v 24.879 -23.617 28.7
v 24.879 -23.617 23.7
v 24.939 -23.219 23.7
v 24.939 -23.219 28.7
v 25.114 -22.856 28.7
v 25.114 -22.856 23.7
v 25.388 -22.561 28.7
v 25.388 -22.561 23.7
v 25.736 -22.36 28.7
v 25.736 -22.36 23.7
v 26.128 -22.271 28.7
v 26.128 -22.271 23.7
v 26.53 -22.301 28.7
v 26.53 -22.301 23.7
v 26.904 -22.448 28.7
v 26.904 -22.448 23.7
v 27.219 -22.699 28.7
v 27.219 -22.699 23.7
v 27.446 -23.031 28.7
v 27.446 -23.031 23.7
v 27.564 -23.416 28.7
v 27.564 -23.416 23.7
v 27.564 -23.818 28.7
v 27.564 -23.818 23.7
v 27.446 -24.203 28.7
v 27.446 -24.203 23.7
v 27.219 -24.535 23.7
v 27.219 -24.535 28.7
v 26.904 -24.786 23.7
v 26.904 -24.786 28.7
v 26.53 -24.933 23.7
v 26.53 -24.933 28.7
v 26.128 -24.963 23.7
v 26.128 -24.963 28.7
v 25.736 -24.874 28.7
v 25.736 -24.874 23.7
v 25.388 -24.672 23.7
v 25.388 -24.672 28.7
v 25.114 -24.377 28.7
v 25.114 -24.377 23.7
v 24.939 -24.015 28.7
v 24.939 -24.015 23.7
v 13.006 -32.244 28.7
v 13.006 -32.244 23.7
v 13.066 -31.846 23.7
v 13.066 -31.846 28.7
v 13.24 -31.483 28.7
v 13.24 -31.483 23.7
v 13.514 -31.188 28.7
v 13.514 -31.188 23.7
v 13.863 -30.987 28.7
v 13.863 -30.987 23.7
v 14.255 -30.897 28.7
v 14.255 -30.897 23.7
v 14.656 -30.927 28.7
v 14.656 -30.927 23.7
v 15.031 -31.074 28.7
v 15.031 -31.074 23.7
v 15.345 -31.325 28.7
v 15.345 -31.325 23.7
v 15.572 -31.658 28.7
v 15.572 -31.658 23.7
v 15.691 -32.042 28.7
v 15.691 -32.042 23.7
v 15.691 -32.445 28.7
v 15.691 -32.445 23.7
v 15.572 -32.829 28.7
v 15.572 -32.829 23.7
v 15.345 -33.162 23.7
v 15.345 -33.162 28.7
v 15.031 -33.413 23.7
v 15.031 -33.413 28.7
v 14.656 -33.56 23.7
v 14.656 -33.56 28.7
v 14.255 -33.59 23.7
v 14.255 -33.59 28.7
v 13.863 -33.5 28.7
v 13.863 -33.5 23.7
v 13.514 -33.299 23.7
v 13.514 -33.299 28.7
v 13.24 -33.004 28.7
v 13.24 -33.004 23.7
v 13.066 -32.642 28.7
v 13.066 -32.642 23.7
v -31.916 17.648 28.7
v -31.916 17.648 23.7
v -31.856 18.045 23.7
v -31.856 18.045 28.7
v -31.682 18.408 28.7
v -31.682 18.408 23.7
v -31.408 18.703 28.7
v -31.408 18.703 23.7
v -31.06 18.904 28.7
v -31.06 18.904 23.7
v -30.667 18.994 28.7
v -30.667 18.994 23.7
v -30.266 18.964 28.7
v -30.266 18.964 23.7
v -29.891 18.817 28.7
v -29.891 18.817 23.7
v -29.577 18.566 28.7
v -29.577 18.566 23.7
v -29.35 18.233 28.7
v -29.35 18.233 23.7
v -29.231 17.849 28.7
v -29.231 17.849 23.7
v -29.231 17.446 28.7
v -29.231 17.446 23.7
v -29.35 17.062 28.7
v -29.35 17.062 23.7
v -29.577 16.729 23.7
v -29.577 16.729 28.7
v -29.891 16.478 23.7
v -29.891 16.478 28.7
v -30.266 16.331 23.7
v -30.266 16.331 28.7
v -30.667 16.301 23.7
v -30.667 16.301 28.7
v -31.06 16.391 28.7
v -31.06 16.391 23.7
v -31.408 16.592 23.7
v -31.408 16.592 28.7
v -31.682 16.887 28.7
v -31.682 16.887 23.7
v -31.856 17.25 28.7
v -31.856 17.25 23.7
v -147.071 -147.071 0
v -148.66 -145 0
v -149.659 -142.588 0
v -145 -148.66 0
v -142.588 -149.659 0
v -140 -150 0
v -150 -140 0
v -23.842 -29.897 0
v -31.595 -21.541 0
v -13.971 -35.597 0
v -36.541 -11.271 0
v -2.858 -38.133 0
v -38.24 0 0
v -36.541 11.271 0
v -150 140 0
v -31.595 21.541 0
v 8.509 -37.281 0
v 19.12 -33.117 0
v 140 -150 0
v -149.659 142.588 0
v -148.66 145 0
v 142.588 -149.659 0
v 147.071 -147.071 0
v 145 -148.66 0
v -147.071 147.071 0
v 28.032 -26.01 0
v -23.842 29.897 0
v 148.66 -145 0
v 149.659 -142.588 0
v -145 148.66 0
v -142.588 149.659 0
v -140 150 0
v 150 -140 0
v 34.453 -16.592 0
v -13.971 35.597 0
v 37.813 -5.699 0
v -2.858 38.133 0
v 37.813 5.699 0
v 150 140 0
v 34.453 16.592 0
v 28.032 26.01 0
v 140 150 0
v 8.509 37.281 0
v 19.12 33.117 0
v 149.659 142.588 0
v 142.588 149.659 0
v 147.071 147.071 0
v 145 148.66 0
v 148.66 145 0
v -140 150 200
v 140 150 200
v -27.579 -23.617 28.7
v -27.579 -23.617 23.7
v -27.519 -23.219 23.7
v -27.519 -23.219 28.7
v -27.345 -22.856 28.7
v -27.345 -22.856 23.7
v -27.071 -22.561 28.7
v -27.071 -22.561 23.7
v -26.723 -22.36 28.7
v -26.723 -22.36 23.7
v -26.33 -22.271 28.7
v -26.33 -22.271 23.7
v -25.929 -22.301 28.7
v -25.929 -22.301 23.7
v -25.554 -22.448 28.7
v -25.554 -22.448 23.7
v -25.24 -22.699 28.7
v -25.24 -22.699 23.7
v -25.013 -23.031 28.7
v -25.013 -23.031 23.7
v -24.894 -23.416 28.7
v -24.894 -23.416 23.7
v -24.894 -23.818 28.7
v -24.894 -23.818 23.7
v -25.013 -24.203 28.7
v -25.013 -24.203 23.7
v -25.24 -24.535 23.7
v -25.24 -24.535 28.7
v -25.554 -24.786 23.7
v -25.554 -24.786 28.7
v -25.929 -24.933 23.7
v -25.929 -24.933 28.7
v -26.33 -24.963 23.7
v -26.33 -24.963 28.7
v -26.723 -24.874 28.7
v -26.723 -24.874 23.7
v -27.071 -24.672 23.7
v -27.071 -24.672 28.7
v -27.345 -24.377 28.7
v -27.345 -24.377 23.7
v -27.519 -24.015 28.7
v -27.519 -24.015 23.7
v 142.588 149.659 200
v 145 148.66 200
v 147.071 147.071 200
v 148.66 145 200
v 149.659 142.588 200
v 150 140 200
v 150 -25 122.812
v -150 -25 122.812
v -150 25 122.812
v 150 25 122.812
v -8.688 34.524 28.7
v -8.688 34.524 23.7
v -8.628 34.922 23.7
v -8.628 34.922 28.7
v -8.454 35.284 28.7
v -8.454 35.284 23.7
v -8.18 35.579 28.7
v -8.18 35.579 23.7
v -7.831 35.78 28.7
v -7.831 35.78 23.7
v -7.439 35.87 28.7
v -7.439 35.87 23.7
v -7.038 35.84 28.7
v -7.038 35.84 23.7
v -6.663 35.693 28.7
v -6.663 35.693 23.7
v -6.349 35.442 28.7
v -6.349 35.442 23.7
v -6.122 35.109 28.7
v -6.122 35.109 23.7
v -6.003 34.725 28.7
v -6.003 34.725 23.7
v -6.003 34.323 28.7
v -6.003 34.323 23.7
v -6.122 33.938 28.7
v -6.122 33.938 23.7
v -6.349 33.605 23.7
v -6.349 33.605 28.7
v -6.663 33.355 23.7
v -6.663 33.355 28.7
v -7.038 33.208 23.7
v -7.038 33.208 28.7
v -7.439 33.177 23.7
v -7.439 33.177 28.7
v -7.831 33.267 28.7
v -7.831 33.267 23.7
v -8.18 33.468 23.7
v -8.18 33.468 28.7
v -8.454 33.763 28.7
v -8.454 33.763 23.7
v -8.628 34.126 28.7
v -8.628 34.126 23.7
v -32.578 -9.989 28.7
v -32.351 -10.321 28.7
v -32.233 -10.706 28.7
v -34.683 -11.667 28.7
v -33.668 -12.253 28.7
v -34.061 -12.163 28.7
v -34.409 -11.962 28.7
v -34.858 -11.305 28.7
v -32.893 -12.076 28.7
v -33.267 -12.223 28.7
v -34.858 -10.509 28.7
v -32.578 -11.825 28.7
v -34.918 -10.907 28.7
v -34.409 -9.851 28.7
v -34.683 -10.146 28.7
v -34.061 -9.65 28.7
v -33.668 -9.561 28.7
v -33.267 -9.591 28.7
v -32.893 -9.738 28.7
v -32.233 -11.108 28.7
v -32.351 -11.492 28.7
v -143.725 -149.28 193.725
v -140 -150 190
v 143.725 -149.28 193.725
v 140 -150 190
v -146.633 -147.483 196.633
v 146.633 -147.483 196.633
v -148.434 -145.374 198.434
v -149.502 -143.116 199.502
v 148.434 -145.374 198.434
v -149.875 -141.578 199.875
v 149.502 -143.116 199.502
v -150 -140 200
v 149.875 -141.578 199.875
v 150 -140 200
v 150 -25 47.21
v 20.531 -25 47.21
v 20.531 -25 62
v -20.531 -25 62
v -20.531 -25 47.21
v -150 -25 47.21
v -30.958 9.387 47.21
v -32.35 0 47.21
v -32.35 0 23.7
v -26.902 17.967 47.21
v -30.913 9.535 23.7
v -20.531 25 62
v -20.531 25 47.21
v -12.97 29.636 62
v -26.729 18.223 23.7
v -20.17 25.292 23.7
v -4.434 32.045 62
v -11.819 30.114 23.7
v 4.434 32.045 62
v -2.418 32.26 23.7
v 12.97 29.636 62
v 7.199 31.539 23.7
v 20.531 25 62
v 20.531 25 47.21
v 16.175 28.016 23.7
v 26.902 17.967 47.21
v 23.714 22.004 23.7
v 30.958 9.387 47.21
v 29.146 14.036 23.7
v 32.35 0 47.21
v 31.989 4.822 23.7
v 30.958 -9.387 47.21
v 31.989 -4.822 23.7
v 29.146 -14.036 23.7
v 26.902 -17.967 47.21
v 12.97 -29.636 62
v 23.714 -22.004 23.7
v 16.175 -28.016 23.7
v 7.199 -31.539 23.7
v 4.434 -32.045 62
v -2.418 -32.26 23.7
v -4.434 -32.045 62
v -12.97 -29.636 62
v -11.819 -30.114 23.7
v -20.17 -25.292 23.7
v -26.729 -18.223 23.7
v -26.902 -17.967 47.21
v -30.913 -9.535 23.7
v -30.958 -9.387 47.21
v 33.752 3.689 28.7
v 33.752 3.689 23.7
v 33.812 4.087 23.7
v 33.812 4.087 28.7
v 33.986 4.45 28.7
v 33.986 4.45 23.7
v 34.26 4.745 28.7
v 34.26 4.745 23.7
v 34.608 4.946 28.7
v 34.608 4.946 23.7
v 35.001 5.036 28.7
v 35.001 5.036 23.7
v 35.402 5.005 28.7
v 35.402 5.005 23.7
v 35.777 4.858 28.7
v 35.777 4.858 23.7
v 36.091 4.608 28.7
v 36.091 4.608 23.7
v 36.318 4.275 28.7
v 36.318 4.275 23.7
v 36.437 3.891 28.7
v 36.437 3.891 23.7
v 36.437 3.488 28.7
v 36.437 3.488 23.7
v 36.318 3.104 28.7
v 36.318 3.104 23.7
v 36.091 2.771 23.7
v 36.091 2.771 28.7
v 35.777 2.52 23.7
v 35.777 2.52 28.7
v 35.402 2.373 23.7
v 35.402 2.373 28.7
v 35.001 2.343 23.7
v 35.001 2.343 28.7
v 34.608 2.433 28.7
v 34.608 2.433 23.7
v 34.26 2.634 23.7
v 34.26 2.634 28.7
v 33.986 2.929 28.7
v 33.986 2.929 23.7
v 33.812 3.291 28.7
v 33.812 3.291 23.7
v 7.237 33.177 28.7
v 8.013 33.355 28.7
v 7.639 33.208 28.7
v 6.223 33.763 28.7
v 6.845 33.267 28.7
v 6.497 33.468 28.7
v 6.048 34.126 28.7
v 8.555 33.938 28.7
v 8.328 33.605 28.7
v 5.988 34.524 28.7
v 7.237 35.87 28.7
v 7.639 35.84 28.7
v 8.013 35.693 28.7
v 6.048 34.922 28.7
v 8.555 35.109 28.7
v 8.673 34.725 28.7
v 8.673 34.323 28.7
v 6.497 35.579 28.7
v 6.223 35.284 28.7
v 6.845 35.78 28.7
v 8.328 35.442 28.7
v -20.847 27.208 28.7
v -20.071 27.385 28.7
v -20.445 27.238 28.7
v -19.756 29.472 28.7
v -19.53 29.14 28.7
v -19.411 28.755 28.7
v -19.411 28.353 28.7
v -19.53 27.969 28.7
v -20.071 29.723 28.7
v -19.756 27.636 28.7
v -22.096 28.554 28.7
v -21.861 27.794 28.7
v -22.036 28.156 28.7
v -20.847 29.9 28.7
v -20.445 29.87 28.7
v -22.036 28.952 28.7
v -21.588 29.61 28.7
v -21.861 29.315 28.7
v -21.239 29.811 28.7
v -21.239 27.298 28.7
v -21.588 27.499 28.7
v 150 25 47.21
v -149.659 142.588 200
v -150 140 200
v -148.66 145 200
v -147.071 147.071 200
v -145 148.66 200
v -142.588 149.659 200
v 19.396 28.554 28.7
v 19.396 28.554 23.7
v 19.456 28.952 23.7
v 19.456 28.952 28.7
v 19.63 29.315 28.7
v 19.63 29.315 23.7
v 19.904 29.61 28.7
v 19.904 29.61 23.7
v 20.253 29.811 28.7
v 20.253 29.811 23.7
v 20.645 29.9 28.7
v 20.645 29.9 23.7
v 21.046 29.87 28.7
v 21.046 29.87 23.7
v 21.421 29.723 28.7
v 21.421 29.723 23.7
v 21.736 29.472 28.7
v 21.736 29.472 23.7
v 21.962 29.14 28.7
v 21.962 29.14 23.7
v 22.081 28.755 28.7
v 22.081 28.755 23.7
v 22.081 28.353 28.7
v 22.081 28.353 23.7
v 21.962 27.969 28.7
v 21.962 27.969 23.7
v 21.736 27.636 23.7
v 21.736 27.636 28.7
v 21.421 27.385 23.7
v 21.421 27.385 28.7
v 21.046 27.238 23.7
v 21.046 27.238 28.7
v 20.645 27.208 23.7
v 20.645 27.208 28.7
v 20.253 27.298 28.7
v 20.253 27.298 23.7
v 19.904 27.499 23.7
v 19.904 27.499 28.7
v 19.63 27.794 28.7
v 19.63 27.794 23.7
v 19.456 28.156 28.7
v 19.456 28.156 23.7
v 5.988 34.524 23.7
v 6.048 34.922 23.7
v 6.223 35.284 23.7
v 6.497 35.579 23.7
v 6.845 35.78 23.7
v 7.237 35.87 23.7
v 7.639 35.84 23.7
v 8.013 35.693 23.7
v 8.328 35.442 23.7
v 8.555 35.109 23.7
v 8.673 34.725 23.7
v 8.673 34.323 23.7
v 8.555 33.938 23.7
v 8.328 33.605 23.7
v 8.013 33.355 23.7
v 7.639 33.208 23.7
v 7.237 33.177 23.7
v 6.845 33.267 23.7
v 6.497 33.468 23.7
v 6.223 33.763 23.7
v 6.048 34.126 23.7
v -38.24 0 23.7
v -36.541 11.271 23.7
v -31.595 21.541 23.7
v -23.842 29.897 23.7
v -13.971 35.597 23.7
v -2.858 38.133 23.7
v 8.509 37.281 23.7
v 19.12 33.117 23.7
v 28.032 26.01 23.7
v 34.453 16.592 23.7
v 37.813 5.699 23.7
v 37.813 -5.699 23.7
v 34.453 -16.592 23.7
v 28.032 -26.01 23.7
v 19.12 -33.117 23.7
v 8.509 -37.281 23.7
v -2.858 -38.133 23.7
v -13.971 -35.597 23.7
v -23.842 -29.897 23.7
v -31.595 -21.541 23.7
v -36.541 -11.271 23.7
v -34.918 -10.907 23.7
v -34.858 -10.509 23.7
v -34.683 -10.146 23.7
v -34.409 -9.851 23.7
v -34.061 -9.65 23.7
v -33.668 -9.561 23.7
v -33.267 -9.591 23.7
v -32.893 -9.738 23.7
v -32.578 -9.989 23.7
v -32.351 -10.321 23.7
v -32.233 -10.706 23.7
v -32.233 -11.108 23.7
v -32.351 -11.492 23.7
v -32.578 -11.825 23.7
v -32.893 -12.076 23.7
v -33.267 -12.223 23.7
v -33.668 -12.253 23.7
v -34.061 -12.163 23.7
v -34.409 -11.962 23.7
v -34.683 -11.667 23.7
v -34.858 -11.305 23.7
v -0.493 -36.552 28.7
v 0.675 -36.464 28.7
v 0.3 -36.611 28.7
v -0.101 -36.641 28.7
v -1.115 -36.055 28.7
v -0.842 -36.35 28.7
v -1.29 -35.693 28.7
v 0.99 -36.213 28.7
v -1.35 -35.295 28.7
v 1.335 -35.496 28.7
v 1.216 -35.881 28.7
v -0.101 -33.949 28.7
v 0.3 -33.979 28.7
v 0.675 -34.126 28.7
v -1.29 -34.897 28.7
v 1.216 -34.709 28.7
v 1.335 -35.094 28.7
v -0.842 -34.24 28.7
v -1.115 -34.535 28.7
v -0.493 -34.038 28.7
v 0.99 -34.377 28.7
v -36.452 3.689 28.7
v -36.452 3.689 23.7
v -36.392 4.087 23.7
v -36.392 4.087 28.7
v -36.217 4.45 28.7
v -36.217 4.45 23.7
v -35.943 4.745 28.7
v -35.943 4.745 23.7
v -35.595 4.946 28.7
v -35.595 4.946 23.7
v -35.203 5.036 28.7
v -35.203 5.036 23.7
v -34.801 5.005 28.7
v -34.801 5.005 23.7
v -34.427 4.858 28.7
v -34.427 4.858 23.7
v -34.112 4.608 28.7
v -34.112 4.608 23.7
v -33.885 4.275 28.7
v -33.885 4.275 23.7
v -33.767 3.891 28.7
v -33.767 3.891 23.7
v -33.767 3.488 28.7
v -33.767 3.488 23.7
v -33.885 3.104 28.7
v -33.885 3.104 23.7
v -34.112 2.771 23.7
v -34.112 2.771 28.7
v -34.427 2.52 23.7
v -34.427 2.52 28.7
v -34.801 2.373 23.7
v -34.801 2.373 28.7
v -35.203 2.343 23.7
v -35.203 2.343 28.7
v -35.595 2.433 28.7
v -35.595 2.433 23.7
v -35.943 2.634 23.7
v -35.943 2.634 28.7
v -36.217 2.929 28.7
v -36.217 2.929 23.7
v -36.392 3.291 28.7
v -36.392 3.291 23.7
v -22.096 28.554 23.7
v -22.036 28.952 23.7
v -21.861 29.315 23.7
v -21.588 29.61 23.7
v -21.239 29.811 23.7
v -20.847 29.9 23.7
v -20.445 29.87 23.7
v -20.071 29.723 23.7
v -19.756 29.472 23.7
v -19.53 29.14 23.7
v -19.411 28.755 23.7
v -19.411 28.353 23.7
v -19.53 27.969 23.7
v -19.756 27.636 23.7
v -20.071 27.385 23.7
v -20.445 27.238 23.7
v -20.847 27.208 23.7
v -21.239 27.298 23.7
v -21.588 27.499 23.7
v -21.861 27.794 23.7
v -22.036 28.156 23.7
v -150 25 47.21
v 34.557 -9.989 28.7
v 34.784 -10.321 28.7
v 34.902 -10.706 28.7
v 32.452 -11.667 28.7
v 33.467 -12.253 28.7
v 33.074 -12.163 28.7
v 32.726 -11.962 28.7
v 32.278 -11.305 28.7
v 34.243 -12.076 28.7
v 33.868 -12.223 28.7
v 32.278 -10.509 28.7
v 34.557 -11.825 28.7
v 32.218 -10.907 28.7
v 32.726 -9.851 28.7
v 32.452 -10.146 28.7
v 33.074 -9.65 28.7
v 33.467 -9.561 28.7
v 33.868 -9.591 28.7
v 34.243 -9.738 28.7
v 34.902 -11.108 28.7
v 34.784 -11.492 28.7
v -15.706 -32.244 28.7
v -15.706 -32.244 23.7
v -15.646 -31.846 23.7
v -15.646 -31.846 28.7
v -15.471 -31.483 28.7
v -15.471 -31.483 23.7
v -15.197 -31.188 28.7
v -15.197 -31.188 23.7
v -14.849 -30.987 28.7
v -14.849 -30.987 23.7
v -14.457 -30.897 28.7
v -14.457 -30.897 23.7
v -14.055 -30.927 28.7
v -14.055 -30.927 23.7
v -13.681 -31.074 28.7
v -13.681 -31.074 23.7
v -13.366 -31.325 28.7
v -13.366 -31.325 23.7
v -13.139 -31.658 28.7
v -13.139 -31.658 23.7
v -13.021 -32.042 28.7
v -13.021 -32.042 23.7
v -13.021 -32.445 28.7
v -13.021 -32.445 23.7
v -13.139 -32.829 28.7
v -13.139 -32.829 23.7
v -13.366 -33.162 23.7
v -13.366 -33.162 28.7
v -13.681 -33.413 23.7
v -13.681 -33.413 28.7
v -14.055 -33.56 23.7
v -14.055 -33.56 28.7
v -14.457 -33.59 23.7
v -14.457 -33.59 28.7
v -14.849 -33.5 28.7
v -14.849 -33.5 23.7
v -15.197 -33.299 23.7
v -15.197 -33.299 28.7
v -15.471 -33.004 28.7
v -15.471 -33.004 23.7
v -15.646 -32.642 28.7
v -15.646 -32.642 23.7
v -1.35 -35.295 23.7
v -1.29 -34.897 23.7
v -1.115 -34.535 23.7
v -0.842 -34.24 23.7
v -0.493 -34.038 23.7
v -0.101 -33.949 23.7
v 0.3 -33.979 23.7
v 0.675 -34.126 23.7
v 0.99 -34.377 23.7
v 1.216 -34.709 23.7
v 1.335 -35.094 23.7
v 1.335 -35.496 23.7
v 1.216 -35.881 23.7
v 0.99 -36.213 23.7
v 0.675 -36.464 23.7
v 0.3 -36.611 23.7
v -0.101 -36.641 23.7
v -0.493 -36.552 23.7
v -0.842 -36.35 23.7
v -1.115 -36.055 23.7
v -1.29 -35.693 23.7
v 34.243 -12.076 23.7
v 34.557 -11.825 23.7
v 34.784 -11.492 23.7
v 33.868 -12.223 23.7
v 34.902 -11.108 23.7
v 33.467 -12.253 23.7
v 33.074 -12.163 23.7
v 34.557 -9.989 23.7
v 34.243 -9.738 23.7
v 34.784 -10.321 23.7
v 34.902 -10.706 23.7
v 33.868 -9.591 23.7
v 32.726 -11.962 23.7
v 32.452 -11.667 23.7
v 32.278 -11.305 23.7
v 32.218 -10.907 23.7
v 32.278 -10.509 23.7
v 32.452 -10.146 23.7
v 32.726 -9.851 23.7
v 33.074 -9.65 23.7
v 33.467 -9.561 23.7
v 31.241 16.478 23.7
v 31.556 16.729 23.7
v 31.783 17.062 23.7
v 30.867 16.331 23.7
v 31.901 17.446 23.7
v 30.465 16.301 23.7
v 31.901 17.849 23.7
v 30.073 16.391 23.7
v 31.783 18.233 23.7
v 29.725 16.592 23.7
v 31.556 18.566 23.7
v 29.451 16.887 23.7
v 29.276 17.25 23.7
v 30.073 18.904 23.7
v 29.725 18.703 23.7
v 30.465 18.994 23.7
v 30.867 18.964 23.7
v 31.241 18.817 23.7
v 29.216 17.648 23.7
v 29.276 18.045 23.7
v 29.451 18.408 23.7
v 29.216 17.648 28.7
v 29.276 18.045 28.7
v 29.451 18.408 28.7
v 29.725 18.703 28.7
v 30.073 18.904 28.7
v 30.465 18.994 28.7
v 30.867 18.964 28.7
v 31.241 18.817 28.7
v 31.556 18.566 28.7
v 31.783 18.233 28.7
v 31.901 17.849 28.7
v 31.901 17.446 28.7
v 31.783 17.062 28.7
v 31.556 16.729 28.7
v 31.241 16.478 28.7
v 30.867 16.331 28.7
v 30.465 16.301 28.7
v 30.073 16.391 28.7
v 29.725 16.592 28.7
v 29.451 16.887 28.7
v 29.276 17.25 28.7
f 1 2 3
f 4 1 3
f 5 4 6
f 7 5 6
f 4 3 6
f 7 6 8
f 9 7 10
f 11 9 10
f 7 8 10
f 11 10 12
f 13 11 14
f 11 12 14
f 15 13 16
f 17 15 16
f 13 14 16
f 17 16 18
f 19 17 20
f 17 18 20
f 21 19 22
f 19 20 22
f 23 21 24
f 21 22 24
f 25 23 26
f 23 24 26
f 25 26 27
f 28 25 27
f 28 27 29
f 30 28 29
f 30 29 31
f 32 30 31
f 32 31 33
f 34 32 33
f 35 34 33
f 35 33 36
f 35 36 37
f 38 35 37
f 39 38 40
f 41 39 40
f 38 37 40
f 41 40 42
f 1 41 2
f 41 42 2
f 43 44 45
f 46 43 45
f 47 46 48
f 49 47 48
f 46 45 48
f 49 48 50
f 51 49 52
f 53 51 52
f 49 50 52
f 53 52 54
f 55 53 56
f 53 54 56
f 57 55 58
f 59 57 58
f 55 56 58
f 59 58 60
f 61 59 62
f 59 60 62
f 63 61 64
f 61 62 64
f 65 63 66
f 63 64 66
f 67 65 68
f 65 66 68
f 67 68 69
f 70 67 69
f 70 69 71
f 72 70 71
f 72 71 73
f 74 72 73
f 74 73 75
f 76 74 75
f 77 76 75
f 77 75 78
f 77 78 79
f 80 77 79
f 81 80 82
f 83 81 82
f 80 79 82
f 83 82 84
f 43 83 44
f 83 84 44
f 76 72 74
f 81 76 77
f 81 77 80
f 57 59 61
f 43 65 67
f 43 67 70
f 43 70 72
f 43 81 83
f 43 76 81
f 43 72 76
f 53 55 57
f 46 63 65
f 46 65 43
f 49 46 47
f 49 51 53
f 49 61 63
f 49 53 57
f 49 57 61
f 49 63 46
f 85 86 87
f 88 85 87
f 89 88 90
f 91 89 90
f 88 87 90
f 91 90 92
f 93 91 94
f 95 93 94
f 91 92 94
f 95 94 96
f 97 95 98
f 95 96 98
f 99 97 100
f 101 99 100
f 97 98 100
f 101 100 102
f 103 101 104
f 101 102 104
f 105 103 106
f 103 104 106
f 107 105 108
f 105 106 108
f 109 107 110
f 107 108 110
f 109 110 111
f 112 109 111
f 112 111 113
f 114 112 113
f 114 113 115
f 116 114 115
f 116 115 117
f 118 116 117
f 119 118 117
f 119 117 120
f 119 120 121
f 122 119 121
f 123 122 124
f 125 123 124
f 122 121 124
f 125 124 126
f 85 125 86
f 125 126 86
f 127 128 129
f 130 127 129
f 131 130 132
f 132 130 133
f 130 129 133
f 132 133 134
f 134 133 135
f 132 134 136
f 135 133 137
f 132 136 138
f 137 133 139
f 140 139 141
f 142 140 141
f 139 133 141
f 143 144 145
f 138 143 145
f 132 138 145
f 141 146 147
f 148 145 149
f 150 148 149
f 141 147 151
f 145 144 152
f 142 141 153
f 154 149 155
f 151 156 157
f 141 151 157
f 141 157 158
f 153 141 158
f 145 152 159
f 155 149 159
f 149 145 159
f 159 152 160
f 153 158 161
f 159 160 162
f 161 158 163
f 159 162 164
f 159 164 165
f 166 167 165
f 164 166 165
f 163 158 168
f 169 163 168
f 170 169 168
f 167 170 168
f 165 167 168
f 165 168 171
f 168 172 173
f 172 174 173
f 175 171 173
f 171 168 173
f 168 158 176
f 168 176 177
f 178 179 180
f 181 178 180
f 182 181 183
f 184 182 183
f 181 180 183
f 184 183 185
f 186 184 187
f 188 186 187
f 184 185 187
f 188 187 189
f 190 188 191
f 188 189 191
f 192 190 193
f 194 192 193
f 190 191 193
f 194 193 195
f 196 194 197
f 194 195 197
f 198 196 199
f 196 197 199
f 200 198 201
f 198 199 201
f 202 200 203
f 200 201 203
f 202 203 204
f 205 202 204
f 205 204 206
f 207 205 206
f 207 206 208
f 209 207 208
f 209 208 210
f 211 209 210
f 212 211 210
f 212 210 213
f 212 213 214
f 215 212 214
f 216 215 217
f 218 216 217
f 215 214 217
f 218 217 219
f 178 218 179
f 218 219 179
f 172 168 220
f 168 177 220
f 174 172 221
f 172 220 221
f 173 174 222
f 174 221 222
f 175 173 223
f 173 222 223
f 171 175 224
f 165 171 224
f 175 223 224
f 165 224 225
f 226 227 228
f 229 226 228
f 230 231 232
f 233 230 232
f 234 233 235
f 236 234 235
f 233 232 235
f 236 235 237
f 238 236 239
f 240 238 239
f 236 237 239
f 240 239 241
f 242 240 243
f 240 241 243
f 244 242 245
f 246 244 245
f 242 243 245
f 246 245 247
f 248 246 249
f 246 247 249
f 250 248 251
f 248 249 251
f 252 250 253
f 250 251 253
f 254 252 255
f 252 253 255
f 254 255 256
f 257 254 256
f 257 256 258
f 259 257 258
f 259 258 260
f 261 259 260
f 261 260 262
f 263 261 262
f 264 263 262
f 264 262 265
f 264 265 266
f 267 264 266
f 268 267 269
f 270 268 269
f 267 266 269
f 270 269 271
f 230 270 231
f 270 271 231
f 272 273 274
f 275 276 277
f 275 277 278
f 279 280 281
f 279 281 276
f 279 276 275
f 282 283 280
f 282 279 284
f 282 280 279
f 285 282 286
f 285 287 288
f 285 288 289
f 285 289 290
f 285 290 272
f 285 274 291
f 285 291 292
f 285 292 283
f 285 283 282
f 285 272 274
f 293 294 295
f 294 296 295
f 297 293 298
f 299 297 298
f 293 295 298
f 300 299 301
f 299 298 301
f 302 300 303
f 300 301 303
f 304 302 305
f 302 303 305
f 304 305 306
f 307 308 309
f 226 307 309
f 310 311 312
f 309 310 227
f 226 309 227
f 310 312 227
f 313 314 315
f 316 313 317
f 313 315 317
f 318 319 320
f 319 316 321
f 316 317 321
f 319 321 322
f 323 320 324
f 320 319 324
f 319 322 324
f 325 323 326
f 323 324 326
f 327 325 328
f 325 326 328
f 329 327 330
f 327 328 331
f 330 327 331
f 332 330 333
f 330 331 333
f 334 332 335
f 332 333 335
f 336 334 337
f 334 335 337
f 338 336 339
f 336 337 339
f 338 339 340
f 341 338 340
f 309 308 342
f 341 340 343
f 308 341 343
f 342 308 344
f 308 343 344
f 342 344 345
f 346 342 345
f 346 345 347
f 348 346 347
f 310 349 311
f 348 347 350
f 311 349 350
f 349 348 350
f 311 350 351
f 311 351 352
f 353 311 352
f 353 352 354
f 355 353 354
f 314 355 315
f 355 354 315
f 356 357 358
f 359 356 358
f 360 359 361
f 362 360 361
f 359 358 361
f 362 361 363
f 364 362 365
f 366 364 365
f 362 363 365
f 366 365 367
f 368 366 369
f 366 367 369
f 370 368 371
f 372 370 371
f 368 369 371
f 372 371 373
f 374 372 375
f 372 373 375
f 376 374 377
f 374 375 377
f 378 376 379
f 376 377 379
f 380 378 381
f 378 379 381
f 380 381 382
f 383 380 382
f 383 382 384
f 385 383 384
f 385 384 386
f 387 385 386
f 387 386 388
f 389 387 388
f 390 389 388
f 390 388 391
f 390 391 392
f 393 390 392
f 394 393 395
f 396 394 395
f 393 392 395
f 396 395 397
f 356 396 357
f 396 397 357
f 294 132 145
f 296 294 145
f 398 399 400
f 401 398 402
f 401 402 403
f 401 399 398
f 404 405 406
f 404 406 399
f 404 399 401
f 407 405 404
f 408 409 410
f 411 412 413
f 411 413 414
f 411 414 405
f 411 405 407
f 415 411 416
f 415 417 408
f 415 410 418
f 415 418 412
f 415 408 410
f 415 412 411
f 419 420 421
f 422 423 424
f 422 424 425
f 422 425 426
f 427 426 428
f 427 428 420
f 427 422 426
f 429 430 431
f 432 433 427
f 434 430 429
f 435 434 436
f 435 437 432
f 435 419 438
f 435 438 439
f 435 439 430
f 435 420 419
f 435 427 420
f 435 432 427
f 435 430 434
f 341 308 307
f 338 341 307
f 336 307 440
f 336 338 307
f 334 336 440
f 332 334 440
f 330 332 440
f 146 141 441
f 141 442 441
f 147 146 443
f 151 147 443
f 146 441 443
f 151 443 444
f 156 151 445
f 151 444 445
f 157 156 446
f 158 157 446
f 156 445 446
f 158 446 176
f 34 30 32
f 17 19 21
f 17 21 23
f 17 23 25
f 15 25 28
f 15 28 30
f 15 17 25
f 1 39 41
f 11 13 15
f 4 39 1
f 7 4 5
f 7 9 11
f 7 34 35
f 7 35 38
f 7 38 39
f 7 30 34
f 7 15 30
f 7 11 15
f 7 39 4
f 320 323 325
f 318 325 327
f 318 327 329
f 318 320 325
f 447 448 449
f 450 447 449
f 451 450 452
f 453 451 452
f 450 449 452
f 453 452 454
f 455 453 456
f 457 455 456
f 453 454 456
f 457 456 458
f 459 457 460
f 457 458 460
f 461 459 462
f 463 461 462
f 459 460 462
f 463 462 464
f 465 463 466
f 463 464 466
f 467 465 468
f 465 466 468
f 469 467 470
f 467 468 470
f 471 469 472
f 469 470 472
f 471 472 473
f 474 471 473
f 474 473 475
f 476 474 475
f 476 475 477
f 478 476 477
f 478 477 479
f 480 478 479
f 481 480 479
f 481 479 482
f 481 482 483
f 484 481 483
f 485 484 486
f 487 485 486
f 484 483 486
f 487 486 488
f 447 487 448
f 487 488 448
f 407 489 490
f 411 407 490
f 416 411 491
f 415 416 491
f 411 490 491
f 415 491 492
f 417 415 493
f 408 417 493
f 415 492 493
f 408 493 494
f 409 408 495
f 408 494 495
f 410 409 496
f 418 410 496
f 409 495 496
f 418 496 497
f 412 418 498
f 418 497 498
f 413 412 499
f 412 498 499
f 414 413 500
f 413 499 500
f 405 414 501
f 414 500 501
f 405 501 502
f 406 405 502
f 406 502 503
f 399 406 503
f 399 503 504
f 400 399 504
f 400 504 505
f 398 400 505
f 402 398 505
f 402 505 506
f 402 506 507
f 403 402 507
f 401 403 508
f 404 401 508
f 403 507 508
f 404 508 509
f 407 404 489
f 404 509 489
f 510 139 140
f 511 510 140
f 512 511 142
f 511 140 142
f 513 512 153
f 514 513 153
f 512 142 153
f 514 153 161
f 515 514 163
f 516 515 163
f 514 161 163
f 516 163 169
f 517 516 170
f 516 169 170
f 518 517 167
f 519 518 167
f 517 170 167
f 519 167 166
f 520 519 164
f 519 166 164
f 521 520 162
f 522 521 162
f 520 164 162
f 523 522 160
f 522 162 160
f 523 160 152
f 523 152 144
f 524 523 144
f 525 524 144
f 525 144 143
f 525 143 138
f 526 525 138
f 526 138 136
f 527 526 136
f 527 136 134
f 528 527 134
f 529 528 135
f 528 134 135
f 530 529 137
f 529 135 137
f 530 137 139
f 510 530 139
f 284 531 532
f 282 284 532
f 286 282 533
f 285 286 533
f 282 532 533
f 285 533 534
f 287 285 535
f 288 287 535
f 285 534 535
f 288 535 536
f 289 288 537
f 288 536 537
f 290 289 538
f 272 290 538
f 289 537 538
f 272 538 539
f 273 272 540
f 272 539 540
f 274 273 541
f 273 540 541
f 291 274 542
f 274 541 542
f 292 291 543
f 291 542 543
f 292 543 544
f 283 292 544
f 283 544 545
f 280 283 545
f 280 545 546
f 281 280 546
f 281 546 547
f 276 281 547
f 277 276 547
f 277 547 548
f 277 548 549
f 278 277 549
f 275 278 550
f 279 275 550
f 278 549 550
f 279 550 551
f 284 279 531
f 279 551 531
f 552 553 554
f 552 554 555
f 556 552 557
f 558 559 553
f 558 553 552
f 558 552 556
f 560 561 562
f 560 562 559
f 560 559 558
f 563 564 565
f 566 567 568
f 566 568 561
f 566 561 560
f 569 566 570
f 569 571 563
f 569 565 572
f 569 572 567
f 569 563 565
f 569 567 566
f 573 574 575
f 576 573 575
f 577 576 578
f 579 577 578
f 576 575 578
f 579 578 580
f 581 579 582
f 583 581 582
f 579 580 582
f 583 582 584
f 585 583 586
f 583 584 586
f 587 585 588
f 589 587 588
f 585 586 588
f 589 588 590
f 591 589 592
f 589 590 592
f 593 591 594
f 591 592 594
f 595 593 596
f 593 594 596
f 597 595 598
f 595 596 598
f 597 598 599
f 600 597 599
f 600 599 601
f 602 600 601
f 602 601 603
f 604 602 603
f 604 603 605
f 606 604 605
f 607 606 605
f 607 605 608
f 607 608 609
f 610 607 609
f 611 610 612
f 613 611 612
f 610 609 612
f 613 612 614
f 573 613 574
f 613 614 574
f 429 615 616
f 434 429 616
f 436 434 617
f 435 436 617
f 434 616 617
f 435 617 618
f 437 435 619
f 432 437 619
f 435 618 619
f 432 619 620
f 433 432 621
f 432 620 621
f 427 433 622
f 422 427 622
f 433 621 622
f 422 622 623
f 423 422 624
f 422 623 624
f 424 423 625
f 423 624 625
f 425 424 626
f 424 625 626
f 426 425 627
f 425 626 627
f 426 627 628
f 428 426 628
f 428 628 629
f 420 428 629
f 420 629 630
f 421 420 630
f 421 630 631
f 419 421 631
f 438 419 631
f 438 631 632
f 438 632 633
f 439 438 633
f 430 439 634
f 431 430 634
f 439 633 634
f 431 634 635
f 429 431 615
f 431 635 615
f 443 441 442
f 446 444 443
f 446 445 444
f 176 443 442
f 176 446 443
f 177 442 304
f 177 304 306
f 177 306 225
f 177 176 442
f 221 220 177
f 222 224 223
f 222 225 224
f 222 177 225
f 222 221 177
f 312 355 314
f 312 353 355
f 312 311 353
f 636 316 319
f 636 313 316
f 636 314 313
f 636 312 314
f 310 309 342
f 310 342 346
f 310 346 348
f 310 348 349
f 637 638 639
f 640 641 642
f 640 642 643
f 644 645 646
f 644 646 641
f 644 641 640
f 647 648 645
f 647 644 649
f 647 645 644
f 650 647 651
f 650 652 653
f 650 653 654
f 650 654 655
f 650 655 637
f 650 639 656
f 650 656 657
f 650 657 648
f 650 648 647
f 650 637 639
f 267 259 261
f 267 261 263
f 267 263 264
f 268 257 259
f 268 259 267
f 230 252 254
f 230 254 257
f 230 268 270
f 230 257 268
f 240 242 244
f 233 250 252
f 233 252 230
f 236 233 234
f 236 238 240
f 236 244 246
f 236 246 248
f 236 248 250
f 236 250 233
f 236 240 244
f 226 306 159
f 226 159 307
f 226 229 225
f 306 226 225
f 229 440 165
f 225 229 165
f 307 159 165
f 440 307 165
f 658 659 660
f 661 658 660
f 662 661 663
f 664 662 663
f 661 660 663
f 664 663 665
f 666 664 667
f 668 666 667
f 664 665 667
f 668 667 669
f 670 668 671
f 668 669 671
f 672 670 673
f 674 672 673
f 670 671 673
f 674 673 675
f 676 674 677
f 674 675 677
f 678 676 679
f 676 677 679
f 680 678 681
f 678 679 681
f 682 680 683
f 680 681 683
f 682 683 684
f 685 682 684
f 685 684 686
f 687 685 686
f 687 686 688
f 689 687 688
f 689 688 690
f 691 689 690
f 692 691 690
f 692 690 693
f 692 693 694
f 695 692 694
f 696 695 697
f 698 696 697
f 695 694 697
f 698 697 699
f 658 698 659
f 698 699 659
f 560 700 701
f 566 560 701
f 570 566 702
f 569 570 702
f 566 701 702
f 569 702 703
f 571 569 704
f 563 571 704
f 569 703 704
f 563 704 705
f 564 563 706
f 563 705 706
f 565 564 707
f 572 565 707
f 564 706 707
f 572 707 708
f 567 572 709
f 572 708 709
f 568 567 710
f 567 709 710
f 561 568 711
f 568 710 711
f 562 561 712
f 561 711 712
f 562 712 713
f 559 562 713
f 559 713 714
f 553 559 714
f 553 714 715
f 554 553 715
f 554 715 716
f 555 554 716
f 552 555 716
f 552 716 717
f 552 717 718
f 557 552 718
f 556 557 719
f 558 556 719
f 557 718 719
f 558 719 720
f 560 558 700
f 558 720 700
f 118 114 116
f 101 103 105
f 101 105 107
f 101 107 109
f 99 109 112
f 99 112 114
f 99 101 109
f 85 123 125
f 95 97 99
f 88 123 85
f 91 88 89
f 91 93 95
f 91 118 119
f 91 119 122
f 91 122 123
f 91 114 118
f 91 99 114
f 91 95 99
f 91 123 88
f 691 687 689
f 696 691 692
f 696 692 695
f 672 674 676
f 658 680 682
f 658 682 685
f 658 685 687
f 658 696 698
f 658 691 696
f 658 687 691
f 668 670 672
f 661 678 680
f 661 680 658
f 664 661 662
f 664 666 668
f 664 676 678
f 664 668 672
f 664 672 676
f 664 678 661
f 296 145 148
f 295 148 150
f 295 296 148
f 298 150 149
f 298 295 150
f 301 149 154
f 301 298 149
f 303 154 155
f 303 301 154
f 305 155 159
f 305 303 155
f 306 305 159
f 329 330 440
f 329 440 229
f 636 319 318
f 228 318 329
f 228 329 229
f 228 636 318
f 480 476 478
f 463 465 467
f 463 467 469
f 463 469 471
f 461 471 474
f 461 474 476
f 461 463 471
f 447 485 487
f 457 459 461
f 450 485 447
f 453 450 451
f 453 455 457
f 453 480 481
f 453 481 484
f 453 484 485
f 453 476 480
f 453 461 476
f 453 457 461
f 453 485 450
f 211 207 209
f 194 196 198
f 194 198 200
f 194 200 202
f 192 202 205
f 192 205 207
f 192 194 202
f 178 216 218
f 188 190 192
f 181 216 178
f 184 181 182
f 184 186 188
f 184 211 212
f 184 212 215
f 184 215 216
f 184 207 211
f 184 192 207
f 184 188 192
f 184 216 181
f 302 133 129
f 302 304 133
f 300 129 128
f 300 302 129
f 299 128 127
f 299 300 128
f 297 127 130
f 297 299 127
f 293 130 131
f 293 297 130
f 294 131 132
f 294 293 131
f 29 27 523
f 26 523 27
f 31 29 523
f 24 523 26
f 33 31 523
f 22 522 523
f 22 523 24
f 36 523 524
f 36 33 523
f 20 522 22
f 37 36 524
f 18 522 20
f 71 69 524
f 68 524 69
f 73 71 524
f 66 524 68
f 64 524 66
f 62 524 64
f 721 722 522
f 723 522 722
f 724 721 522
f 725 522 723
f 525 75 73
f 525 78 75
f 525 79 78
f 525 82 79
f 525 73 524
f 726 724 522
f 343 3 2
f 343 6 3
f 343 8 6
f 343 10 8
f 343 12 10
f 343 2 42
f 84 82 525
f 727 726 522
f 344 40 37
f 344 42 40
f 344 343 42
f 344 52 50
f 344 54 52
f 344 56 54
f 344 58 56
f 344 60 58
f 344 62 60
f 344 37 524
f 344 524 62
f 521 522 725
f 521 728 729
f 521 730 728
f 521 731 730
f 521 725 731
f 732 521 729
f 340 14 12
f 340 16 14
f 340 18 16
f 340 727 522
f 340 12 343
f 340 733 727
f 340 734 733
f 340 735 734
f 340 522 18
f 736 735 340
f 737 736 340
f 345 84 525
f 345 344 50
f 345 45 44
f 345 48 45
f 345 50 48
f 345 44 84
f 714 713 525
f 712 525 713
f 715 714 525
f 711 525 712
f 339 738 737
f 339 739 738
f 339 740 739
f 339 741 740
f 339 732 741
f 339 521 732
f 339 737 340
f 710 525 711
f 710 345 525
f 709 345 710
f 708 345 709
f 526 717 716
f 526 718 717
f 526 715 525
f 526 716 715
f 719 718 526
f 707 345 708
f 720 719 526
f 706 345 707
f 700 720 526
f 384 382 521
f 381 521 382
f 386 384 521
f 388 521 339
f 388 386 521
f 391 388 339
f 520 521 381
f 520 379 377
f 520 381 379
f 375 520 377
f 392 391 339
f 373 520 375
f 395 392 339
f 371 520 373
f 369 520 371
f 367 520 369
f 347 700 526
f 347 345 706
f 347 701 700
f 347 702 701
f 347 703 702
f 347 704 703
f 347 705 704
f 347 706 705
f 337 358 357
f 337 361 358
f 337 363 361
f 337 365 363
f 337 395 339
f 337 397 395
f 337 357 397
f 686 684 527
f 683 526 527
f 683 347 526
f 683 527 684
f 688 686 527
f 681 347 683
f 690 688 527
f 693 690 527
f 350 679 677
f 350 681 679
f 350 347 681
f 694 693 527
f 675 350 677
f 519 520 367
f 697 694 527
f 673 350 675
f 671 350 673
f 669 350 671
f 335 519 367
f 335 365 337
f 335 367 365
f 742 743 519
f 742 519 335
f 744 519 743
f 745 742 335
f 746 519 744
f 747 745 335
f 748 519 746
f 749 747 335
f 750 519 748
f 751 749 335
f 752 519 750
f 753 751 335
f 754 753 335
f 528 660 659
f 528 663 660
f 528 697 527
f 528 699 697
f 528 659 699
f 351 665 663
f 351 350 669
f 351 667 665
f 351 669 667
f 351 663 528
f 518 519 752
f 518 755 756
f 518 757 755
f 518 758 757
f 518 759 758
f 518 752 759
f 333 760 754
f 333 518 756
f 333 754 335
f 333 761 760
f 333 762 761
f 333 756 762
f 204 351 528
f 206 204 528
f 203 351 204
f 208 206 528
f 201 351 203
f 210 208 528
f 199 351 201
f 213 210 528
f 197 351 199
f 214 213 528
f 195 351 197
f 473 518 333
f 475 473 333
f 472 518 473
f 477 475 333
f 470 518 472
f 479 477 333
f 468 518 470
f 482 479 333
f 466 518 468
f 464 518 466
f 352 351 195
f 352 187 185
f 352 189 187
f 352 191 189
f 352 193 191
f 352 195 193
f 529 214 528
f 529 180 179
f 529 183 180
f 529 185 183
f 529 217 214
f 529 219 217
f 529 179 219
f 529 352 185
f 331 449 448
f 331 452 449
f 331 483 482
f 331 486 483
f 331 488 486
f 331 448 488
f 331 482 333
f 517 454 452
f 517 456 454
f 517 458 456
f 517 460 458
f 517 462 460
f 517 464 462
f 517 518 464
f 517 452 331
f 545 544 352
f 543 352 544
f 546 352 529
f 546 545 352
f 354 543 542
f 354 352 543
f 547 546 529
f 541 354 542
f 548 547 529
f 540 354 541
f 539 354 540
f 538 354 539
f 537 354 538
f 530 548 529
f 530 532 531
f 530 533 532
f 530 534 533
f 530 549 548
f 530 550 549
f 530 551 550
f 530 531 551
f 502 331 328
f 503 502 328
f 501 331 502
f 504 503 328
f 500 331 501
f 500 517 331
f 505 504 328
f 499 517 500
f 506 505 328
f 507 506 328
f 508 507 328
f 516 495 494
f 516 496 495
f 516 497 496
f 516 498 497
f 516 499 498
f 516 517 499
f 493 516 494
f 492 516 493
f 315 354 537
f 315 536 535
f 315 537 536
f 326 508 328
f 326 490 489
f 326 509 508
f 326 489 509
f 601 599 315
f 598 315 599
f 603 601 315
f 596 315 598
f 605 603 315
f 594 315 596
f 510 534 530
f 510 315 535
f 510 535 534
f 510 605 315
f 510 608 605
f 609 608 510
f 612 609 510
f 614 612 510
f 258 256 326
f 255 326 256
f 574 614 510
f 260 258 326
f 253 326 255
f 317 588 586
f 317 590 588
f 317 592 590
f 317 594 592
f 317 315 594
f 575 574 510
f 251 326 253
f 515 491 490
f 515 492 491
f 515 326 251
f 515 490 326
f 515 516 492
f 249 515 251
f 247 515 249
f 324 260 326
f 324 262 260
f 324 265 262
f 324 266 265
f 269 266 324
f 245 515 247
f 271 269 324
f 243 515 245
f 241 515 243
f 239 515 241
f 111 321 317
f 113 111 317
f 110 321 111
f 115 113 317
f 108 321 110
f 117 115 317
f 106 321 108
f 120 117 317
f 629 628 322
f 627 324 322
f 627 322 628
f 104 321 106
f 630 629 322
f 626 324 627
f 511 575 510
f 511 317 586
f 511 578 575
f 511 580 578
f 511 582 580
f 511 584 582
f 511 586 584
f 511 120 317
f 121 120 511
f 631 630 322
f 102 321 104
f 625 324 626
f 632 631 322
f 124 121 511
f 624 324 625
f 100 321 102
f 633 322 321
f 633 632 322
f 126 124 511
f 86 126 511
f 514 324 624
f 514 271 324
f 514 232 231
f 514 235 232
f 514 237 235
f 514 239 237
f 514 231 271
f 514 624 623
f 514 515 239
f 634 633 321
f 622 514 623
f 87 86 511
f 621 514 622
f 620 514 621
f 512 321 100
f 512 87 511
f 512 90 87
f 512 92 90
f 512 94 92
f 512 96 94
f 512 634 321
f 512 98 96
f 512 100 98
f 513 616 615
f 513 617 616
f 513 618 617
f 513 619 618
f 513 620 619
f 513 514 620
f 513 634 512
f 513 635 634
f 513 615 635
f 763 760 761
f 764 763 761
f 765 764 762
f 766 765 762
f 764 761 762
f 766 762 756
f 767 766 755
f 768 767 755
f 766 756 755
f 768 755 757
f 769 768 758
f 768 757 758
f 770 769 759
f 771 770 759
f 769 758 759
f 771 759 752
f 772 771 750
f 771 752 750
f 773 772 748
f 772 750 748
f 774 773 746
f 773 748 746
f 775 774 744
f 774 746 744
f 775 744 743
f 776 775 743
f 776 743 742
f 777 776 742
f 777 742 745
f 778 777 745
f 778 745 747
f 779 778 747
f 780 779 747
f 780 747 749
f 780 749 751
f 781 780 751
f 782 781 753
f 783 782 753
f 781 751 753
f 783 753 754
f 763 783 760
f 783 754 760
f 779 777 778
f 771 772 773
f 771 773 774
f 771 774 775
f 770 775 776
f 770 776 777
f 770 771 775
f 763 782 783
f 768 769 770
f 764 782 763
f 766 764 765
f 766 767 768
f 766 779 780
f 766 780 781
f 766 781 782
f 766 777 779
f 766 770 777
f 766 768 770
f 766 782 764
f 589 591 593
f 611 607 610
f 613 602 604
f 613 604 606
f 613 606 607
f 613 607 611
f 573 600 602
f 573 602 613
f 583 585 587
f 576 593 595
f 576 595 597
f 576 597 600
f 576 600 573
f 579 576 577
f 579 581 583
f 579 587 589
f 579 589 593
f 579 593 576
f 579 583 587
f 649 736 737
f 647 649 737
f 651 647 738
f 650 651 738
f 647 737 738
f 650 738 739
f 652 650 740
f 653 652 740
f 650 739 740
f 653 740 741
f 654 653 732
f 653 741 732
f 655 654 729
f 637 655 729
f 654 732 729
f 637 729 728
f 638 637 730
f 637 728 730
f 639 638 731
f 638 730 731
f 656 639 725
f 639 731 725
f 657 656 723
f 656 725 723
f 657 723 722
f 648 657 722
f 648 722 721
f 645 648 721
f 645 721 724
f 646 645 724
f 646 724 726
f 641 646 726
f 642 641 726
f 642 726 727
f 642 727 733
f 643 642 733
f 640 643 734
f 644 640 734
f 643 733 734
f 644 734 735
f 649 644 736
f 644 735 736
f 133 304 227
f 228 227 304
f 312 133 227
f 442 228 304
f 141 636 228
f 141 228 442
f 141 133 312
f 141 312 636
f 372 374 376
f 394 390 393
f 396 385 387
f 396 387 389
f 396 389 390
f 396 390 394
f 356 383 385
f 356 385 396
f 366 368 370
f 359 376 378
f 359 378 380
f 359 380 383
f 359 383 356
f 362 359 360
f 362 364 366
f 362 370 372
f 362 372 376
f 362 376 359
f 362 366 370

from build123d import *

# Parameters (mm, degrees)
SKETCH_1_W          = 300
SKETCH_1_H          = 300
EXTRUDE_3_DEPTH     = 200
SKETCH_5_R          = 32.35
CUT_EXTRUDE_3_DEPTH = 62
SKETCH_6_R          = 38.24
CUT_EXTRUDE_4_DEPTH = 23.7
CUT_EXTRUDE_5_REACH = 392.512
SKETCH_8_W          = 75.602160899
SKETCH_8_H          = 50
SKETCH_10_R         = 1.35
CUT_EXTRUDE_7_DEPTH = 5
FILLET_1_R          = 10


with BuildPart() as part:
    # 草图1 → 凸台-拉伸3 (new body)
    with BuildSketch(Plane.XY):
        Rectangle(SKETCH_1_W, SKETCH_1_H)
    extrude(amount=EXTRUDE_3_DEPTH)

    # 草图5 → 切除-拉伸3 (cut)
    with BuildSketch(Plane(origin=(0, 0, 0), x_dir=(-1, 0, 0), z_dir=(0, 0, -1))):
        Circle(SKETCH_5_R)
    extrude(amount=-CUT_EXTRUDE_3_DEPTH, mode=Mode.SUBTRACT)

    # 草图6 → 切除-拉伸4 (cut)
    with BuildSketch(Plane(origin=(0, 0, 0), x_dir=(-1, 0, 0), z_dir=(0, 0, -1))):
        Circle(SKETCH_6_R)
    extrude(amount=-CUT_EXTRUDE_4_DEPTH, mode=Mode.SUBTRACT)

    # 草图8 → 切除-拉伸5 (cut, up to next)
    with BuildSketch(Plane.ZY.offset(150), mode=Mode.PRIVATE) as cut_extrude_5_sk1:
        with Locations((85.011080449, 0)):
            Rectangle(SKETCH_8_W, SKETCH_8_H)
    cut_extrude_5_tool1 = extrude(cut_extrude_5_sk1.sketch, amount=-CUT_EXTRUDE_5_REACH, mode=Mode.PRIVATE) & part.part
    add(cut_extrude_5_tool1.solids().sort_by_distance((-150, 0, 85.01108))[0], mode=Mode.SUBTRACT)

    # 草图10 → 切除-拉伸7 (cut)
    with BuildSketch(Plane(origin=(0, 0, 23.7), x_dir=(-1, 0, 0), z_dir=(0, 0, -1))):
        with Locations((0, -35.295)):
            Circle(SKETCH_10_R)
        with Locations((-14.355769817, -32.243586927)):
            Circle(SKETCH_10_R)
        with Locations((-26.229296615, -23.616964751)):
            Circle(SKETCH_10_R)
        with Locations((-33.567539743, -10.906754816)):
            Circle(SKETCH_10_R)
        with Locations((-35.101650297, 3.689332111)):
            Circle(SKETCH_10_R)
        with Locations((-30.566366627, 17.6475)):
            Circle(SKETCH_10_R)
        with Locations((-20.74588048, 28.554254816)):
            Circle(SKETCH_10_R)
        with Locations((-7.338243127, 34.523719568)):
            Circle(SKETCH_10_R)
        with Locations((7.338243127, 34.523719568)):
            Circle(SKETCH_10_R)
        with Locations((20.74588048, 28.554254816)):
            Circle(SKETCH_10_R)
        with Locations((30.566366627, 17.6475)):
            Circle(SKETCH_10_R)
        with Locations((35.101650297, 3.689332111)):
            Circle(SKETCH_10_R)
        with Locations((33.567539743, -10.906754816)):
            Circle(SKETCH_10_R)
        with Locations((26.229296615, -23.616964751)):
            Circle(SKETCH_10_R)
        with Locations((14.355769817, -32.243586927)):
            Circle(SKETCH_10_R)
    extrude(amount=-CUT_EXTRUDE_7_DEPTH, mode=Mode.SUBTRACT)

    # 圆角1
    fillet_1_edges = [part.edges().sort_by_distance(p)[0] for p in [
        (0, -150, 200),
        (150, -150, 100),
        (-150, -150, 100),
        (-150, 150, 100),
        (150, 150, 100),
    ]]
    fillet(fillet_1_edges, radius=FILLET_1_R)


solid = part.part
